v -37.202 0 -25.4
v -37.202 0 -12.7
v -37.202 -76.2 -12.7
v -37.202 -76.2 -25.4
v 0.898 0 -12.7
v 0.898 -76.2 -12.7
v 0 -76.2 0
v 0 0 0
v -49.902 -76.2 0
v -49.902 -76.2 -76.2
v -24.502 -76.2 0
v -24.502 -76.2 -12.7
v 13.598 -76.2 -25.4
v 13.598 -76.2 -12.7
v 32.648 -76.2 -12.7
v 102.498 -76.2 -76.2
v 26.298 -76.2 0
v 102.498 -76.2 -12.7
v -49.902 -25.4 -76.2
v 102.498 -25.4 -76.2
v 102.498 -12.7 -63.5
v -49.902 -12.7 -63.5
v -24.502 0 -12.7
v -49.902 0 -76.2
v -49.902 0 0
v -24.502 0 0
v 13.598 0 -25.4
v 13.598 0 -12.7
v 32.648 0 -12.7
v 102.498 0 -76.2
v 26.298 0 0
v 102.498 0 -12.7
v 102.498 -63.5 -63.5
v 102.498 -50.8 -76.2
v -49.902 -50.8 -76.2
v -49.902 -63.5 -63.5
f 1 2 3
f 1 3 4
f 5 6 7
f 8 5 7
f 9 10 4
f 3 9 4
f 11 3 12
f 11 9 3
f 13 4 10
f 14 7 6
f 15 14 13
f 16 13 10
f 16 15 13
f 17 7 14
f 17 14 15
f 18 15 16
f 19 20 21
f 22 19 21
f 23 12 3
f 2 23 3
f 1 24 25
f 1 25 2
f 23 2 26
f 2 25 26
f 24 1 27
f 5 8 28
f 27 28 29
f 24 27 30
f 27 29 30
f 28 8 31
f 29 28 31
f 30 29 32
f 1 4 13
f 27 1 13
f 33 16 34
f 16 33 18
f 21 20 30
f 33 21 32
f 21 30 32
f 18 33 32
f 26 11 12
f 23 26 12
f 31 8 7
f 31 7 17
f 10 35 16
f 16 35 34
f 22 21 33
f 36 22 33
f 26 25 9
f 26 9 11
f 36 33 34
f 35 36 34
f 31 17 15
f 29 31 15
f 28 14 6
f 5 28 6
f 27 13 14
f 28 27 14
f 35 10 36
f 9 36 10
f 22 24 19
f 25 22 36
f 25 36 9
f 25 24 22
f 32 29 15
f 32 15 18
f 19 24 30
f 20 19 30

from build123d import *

# Parameters (mm, degrees)
F0_W     = 152.4
F0_H     = 76.2
F1_DEPTH = 76.2
F3_DEPTH = 76.2
F5_DEPTH = 152.4


with BuildPart() as f1:
    # F0 (on Front) → F1 (new body)
    with BuildSketch(Plane.XZ):
        with Locations((26.298277, -38.1)):
            Rectangle(F0_W, F0_H)
    extrude(amount=F1_DEPTH)

    # F2 (on face) → F3 (cut)
    with BuildSketch(Plane.XZ.offset(76.2)):
        Polygon((0, 0), (-24.501723, 0), (-24.501723, -12.7), (-37.201723, -12.7), (-37.201723, -25.4), (13.598277, -25.4), (13.598277, -12.7), (0.898277, -12.7), align=None)
        Polygon((32.648277, -12.7), (102.498277, -12.7), (102.498277, 0), (26.298277, 0), align=None)
    extrude(amount=-F3_DEPTH, mode=Mode.SUBTRACT)

    # F4 (on face) → F5 (cut, through all)
    with BuildSketch(Plane.YZ.offset(102.498277)):
        Polygon((-50.8, -76.2), (-25.4, -76.2), (-12.7, -63.5), (-63.5, -63.5), align=None)
    extrude(amount=-F5_DEPTH, mode=Mode.SUBTRACT)


solid = f1.part
